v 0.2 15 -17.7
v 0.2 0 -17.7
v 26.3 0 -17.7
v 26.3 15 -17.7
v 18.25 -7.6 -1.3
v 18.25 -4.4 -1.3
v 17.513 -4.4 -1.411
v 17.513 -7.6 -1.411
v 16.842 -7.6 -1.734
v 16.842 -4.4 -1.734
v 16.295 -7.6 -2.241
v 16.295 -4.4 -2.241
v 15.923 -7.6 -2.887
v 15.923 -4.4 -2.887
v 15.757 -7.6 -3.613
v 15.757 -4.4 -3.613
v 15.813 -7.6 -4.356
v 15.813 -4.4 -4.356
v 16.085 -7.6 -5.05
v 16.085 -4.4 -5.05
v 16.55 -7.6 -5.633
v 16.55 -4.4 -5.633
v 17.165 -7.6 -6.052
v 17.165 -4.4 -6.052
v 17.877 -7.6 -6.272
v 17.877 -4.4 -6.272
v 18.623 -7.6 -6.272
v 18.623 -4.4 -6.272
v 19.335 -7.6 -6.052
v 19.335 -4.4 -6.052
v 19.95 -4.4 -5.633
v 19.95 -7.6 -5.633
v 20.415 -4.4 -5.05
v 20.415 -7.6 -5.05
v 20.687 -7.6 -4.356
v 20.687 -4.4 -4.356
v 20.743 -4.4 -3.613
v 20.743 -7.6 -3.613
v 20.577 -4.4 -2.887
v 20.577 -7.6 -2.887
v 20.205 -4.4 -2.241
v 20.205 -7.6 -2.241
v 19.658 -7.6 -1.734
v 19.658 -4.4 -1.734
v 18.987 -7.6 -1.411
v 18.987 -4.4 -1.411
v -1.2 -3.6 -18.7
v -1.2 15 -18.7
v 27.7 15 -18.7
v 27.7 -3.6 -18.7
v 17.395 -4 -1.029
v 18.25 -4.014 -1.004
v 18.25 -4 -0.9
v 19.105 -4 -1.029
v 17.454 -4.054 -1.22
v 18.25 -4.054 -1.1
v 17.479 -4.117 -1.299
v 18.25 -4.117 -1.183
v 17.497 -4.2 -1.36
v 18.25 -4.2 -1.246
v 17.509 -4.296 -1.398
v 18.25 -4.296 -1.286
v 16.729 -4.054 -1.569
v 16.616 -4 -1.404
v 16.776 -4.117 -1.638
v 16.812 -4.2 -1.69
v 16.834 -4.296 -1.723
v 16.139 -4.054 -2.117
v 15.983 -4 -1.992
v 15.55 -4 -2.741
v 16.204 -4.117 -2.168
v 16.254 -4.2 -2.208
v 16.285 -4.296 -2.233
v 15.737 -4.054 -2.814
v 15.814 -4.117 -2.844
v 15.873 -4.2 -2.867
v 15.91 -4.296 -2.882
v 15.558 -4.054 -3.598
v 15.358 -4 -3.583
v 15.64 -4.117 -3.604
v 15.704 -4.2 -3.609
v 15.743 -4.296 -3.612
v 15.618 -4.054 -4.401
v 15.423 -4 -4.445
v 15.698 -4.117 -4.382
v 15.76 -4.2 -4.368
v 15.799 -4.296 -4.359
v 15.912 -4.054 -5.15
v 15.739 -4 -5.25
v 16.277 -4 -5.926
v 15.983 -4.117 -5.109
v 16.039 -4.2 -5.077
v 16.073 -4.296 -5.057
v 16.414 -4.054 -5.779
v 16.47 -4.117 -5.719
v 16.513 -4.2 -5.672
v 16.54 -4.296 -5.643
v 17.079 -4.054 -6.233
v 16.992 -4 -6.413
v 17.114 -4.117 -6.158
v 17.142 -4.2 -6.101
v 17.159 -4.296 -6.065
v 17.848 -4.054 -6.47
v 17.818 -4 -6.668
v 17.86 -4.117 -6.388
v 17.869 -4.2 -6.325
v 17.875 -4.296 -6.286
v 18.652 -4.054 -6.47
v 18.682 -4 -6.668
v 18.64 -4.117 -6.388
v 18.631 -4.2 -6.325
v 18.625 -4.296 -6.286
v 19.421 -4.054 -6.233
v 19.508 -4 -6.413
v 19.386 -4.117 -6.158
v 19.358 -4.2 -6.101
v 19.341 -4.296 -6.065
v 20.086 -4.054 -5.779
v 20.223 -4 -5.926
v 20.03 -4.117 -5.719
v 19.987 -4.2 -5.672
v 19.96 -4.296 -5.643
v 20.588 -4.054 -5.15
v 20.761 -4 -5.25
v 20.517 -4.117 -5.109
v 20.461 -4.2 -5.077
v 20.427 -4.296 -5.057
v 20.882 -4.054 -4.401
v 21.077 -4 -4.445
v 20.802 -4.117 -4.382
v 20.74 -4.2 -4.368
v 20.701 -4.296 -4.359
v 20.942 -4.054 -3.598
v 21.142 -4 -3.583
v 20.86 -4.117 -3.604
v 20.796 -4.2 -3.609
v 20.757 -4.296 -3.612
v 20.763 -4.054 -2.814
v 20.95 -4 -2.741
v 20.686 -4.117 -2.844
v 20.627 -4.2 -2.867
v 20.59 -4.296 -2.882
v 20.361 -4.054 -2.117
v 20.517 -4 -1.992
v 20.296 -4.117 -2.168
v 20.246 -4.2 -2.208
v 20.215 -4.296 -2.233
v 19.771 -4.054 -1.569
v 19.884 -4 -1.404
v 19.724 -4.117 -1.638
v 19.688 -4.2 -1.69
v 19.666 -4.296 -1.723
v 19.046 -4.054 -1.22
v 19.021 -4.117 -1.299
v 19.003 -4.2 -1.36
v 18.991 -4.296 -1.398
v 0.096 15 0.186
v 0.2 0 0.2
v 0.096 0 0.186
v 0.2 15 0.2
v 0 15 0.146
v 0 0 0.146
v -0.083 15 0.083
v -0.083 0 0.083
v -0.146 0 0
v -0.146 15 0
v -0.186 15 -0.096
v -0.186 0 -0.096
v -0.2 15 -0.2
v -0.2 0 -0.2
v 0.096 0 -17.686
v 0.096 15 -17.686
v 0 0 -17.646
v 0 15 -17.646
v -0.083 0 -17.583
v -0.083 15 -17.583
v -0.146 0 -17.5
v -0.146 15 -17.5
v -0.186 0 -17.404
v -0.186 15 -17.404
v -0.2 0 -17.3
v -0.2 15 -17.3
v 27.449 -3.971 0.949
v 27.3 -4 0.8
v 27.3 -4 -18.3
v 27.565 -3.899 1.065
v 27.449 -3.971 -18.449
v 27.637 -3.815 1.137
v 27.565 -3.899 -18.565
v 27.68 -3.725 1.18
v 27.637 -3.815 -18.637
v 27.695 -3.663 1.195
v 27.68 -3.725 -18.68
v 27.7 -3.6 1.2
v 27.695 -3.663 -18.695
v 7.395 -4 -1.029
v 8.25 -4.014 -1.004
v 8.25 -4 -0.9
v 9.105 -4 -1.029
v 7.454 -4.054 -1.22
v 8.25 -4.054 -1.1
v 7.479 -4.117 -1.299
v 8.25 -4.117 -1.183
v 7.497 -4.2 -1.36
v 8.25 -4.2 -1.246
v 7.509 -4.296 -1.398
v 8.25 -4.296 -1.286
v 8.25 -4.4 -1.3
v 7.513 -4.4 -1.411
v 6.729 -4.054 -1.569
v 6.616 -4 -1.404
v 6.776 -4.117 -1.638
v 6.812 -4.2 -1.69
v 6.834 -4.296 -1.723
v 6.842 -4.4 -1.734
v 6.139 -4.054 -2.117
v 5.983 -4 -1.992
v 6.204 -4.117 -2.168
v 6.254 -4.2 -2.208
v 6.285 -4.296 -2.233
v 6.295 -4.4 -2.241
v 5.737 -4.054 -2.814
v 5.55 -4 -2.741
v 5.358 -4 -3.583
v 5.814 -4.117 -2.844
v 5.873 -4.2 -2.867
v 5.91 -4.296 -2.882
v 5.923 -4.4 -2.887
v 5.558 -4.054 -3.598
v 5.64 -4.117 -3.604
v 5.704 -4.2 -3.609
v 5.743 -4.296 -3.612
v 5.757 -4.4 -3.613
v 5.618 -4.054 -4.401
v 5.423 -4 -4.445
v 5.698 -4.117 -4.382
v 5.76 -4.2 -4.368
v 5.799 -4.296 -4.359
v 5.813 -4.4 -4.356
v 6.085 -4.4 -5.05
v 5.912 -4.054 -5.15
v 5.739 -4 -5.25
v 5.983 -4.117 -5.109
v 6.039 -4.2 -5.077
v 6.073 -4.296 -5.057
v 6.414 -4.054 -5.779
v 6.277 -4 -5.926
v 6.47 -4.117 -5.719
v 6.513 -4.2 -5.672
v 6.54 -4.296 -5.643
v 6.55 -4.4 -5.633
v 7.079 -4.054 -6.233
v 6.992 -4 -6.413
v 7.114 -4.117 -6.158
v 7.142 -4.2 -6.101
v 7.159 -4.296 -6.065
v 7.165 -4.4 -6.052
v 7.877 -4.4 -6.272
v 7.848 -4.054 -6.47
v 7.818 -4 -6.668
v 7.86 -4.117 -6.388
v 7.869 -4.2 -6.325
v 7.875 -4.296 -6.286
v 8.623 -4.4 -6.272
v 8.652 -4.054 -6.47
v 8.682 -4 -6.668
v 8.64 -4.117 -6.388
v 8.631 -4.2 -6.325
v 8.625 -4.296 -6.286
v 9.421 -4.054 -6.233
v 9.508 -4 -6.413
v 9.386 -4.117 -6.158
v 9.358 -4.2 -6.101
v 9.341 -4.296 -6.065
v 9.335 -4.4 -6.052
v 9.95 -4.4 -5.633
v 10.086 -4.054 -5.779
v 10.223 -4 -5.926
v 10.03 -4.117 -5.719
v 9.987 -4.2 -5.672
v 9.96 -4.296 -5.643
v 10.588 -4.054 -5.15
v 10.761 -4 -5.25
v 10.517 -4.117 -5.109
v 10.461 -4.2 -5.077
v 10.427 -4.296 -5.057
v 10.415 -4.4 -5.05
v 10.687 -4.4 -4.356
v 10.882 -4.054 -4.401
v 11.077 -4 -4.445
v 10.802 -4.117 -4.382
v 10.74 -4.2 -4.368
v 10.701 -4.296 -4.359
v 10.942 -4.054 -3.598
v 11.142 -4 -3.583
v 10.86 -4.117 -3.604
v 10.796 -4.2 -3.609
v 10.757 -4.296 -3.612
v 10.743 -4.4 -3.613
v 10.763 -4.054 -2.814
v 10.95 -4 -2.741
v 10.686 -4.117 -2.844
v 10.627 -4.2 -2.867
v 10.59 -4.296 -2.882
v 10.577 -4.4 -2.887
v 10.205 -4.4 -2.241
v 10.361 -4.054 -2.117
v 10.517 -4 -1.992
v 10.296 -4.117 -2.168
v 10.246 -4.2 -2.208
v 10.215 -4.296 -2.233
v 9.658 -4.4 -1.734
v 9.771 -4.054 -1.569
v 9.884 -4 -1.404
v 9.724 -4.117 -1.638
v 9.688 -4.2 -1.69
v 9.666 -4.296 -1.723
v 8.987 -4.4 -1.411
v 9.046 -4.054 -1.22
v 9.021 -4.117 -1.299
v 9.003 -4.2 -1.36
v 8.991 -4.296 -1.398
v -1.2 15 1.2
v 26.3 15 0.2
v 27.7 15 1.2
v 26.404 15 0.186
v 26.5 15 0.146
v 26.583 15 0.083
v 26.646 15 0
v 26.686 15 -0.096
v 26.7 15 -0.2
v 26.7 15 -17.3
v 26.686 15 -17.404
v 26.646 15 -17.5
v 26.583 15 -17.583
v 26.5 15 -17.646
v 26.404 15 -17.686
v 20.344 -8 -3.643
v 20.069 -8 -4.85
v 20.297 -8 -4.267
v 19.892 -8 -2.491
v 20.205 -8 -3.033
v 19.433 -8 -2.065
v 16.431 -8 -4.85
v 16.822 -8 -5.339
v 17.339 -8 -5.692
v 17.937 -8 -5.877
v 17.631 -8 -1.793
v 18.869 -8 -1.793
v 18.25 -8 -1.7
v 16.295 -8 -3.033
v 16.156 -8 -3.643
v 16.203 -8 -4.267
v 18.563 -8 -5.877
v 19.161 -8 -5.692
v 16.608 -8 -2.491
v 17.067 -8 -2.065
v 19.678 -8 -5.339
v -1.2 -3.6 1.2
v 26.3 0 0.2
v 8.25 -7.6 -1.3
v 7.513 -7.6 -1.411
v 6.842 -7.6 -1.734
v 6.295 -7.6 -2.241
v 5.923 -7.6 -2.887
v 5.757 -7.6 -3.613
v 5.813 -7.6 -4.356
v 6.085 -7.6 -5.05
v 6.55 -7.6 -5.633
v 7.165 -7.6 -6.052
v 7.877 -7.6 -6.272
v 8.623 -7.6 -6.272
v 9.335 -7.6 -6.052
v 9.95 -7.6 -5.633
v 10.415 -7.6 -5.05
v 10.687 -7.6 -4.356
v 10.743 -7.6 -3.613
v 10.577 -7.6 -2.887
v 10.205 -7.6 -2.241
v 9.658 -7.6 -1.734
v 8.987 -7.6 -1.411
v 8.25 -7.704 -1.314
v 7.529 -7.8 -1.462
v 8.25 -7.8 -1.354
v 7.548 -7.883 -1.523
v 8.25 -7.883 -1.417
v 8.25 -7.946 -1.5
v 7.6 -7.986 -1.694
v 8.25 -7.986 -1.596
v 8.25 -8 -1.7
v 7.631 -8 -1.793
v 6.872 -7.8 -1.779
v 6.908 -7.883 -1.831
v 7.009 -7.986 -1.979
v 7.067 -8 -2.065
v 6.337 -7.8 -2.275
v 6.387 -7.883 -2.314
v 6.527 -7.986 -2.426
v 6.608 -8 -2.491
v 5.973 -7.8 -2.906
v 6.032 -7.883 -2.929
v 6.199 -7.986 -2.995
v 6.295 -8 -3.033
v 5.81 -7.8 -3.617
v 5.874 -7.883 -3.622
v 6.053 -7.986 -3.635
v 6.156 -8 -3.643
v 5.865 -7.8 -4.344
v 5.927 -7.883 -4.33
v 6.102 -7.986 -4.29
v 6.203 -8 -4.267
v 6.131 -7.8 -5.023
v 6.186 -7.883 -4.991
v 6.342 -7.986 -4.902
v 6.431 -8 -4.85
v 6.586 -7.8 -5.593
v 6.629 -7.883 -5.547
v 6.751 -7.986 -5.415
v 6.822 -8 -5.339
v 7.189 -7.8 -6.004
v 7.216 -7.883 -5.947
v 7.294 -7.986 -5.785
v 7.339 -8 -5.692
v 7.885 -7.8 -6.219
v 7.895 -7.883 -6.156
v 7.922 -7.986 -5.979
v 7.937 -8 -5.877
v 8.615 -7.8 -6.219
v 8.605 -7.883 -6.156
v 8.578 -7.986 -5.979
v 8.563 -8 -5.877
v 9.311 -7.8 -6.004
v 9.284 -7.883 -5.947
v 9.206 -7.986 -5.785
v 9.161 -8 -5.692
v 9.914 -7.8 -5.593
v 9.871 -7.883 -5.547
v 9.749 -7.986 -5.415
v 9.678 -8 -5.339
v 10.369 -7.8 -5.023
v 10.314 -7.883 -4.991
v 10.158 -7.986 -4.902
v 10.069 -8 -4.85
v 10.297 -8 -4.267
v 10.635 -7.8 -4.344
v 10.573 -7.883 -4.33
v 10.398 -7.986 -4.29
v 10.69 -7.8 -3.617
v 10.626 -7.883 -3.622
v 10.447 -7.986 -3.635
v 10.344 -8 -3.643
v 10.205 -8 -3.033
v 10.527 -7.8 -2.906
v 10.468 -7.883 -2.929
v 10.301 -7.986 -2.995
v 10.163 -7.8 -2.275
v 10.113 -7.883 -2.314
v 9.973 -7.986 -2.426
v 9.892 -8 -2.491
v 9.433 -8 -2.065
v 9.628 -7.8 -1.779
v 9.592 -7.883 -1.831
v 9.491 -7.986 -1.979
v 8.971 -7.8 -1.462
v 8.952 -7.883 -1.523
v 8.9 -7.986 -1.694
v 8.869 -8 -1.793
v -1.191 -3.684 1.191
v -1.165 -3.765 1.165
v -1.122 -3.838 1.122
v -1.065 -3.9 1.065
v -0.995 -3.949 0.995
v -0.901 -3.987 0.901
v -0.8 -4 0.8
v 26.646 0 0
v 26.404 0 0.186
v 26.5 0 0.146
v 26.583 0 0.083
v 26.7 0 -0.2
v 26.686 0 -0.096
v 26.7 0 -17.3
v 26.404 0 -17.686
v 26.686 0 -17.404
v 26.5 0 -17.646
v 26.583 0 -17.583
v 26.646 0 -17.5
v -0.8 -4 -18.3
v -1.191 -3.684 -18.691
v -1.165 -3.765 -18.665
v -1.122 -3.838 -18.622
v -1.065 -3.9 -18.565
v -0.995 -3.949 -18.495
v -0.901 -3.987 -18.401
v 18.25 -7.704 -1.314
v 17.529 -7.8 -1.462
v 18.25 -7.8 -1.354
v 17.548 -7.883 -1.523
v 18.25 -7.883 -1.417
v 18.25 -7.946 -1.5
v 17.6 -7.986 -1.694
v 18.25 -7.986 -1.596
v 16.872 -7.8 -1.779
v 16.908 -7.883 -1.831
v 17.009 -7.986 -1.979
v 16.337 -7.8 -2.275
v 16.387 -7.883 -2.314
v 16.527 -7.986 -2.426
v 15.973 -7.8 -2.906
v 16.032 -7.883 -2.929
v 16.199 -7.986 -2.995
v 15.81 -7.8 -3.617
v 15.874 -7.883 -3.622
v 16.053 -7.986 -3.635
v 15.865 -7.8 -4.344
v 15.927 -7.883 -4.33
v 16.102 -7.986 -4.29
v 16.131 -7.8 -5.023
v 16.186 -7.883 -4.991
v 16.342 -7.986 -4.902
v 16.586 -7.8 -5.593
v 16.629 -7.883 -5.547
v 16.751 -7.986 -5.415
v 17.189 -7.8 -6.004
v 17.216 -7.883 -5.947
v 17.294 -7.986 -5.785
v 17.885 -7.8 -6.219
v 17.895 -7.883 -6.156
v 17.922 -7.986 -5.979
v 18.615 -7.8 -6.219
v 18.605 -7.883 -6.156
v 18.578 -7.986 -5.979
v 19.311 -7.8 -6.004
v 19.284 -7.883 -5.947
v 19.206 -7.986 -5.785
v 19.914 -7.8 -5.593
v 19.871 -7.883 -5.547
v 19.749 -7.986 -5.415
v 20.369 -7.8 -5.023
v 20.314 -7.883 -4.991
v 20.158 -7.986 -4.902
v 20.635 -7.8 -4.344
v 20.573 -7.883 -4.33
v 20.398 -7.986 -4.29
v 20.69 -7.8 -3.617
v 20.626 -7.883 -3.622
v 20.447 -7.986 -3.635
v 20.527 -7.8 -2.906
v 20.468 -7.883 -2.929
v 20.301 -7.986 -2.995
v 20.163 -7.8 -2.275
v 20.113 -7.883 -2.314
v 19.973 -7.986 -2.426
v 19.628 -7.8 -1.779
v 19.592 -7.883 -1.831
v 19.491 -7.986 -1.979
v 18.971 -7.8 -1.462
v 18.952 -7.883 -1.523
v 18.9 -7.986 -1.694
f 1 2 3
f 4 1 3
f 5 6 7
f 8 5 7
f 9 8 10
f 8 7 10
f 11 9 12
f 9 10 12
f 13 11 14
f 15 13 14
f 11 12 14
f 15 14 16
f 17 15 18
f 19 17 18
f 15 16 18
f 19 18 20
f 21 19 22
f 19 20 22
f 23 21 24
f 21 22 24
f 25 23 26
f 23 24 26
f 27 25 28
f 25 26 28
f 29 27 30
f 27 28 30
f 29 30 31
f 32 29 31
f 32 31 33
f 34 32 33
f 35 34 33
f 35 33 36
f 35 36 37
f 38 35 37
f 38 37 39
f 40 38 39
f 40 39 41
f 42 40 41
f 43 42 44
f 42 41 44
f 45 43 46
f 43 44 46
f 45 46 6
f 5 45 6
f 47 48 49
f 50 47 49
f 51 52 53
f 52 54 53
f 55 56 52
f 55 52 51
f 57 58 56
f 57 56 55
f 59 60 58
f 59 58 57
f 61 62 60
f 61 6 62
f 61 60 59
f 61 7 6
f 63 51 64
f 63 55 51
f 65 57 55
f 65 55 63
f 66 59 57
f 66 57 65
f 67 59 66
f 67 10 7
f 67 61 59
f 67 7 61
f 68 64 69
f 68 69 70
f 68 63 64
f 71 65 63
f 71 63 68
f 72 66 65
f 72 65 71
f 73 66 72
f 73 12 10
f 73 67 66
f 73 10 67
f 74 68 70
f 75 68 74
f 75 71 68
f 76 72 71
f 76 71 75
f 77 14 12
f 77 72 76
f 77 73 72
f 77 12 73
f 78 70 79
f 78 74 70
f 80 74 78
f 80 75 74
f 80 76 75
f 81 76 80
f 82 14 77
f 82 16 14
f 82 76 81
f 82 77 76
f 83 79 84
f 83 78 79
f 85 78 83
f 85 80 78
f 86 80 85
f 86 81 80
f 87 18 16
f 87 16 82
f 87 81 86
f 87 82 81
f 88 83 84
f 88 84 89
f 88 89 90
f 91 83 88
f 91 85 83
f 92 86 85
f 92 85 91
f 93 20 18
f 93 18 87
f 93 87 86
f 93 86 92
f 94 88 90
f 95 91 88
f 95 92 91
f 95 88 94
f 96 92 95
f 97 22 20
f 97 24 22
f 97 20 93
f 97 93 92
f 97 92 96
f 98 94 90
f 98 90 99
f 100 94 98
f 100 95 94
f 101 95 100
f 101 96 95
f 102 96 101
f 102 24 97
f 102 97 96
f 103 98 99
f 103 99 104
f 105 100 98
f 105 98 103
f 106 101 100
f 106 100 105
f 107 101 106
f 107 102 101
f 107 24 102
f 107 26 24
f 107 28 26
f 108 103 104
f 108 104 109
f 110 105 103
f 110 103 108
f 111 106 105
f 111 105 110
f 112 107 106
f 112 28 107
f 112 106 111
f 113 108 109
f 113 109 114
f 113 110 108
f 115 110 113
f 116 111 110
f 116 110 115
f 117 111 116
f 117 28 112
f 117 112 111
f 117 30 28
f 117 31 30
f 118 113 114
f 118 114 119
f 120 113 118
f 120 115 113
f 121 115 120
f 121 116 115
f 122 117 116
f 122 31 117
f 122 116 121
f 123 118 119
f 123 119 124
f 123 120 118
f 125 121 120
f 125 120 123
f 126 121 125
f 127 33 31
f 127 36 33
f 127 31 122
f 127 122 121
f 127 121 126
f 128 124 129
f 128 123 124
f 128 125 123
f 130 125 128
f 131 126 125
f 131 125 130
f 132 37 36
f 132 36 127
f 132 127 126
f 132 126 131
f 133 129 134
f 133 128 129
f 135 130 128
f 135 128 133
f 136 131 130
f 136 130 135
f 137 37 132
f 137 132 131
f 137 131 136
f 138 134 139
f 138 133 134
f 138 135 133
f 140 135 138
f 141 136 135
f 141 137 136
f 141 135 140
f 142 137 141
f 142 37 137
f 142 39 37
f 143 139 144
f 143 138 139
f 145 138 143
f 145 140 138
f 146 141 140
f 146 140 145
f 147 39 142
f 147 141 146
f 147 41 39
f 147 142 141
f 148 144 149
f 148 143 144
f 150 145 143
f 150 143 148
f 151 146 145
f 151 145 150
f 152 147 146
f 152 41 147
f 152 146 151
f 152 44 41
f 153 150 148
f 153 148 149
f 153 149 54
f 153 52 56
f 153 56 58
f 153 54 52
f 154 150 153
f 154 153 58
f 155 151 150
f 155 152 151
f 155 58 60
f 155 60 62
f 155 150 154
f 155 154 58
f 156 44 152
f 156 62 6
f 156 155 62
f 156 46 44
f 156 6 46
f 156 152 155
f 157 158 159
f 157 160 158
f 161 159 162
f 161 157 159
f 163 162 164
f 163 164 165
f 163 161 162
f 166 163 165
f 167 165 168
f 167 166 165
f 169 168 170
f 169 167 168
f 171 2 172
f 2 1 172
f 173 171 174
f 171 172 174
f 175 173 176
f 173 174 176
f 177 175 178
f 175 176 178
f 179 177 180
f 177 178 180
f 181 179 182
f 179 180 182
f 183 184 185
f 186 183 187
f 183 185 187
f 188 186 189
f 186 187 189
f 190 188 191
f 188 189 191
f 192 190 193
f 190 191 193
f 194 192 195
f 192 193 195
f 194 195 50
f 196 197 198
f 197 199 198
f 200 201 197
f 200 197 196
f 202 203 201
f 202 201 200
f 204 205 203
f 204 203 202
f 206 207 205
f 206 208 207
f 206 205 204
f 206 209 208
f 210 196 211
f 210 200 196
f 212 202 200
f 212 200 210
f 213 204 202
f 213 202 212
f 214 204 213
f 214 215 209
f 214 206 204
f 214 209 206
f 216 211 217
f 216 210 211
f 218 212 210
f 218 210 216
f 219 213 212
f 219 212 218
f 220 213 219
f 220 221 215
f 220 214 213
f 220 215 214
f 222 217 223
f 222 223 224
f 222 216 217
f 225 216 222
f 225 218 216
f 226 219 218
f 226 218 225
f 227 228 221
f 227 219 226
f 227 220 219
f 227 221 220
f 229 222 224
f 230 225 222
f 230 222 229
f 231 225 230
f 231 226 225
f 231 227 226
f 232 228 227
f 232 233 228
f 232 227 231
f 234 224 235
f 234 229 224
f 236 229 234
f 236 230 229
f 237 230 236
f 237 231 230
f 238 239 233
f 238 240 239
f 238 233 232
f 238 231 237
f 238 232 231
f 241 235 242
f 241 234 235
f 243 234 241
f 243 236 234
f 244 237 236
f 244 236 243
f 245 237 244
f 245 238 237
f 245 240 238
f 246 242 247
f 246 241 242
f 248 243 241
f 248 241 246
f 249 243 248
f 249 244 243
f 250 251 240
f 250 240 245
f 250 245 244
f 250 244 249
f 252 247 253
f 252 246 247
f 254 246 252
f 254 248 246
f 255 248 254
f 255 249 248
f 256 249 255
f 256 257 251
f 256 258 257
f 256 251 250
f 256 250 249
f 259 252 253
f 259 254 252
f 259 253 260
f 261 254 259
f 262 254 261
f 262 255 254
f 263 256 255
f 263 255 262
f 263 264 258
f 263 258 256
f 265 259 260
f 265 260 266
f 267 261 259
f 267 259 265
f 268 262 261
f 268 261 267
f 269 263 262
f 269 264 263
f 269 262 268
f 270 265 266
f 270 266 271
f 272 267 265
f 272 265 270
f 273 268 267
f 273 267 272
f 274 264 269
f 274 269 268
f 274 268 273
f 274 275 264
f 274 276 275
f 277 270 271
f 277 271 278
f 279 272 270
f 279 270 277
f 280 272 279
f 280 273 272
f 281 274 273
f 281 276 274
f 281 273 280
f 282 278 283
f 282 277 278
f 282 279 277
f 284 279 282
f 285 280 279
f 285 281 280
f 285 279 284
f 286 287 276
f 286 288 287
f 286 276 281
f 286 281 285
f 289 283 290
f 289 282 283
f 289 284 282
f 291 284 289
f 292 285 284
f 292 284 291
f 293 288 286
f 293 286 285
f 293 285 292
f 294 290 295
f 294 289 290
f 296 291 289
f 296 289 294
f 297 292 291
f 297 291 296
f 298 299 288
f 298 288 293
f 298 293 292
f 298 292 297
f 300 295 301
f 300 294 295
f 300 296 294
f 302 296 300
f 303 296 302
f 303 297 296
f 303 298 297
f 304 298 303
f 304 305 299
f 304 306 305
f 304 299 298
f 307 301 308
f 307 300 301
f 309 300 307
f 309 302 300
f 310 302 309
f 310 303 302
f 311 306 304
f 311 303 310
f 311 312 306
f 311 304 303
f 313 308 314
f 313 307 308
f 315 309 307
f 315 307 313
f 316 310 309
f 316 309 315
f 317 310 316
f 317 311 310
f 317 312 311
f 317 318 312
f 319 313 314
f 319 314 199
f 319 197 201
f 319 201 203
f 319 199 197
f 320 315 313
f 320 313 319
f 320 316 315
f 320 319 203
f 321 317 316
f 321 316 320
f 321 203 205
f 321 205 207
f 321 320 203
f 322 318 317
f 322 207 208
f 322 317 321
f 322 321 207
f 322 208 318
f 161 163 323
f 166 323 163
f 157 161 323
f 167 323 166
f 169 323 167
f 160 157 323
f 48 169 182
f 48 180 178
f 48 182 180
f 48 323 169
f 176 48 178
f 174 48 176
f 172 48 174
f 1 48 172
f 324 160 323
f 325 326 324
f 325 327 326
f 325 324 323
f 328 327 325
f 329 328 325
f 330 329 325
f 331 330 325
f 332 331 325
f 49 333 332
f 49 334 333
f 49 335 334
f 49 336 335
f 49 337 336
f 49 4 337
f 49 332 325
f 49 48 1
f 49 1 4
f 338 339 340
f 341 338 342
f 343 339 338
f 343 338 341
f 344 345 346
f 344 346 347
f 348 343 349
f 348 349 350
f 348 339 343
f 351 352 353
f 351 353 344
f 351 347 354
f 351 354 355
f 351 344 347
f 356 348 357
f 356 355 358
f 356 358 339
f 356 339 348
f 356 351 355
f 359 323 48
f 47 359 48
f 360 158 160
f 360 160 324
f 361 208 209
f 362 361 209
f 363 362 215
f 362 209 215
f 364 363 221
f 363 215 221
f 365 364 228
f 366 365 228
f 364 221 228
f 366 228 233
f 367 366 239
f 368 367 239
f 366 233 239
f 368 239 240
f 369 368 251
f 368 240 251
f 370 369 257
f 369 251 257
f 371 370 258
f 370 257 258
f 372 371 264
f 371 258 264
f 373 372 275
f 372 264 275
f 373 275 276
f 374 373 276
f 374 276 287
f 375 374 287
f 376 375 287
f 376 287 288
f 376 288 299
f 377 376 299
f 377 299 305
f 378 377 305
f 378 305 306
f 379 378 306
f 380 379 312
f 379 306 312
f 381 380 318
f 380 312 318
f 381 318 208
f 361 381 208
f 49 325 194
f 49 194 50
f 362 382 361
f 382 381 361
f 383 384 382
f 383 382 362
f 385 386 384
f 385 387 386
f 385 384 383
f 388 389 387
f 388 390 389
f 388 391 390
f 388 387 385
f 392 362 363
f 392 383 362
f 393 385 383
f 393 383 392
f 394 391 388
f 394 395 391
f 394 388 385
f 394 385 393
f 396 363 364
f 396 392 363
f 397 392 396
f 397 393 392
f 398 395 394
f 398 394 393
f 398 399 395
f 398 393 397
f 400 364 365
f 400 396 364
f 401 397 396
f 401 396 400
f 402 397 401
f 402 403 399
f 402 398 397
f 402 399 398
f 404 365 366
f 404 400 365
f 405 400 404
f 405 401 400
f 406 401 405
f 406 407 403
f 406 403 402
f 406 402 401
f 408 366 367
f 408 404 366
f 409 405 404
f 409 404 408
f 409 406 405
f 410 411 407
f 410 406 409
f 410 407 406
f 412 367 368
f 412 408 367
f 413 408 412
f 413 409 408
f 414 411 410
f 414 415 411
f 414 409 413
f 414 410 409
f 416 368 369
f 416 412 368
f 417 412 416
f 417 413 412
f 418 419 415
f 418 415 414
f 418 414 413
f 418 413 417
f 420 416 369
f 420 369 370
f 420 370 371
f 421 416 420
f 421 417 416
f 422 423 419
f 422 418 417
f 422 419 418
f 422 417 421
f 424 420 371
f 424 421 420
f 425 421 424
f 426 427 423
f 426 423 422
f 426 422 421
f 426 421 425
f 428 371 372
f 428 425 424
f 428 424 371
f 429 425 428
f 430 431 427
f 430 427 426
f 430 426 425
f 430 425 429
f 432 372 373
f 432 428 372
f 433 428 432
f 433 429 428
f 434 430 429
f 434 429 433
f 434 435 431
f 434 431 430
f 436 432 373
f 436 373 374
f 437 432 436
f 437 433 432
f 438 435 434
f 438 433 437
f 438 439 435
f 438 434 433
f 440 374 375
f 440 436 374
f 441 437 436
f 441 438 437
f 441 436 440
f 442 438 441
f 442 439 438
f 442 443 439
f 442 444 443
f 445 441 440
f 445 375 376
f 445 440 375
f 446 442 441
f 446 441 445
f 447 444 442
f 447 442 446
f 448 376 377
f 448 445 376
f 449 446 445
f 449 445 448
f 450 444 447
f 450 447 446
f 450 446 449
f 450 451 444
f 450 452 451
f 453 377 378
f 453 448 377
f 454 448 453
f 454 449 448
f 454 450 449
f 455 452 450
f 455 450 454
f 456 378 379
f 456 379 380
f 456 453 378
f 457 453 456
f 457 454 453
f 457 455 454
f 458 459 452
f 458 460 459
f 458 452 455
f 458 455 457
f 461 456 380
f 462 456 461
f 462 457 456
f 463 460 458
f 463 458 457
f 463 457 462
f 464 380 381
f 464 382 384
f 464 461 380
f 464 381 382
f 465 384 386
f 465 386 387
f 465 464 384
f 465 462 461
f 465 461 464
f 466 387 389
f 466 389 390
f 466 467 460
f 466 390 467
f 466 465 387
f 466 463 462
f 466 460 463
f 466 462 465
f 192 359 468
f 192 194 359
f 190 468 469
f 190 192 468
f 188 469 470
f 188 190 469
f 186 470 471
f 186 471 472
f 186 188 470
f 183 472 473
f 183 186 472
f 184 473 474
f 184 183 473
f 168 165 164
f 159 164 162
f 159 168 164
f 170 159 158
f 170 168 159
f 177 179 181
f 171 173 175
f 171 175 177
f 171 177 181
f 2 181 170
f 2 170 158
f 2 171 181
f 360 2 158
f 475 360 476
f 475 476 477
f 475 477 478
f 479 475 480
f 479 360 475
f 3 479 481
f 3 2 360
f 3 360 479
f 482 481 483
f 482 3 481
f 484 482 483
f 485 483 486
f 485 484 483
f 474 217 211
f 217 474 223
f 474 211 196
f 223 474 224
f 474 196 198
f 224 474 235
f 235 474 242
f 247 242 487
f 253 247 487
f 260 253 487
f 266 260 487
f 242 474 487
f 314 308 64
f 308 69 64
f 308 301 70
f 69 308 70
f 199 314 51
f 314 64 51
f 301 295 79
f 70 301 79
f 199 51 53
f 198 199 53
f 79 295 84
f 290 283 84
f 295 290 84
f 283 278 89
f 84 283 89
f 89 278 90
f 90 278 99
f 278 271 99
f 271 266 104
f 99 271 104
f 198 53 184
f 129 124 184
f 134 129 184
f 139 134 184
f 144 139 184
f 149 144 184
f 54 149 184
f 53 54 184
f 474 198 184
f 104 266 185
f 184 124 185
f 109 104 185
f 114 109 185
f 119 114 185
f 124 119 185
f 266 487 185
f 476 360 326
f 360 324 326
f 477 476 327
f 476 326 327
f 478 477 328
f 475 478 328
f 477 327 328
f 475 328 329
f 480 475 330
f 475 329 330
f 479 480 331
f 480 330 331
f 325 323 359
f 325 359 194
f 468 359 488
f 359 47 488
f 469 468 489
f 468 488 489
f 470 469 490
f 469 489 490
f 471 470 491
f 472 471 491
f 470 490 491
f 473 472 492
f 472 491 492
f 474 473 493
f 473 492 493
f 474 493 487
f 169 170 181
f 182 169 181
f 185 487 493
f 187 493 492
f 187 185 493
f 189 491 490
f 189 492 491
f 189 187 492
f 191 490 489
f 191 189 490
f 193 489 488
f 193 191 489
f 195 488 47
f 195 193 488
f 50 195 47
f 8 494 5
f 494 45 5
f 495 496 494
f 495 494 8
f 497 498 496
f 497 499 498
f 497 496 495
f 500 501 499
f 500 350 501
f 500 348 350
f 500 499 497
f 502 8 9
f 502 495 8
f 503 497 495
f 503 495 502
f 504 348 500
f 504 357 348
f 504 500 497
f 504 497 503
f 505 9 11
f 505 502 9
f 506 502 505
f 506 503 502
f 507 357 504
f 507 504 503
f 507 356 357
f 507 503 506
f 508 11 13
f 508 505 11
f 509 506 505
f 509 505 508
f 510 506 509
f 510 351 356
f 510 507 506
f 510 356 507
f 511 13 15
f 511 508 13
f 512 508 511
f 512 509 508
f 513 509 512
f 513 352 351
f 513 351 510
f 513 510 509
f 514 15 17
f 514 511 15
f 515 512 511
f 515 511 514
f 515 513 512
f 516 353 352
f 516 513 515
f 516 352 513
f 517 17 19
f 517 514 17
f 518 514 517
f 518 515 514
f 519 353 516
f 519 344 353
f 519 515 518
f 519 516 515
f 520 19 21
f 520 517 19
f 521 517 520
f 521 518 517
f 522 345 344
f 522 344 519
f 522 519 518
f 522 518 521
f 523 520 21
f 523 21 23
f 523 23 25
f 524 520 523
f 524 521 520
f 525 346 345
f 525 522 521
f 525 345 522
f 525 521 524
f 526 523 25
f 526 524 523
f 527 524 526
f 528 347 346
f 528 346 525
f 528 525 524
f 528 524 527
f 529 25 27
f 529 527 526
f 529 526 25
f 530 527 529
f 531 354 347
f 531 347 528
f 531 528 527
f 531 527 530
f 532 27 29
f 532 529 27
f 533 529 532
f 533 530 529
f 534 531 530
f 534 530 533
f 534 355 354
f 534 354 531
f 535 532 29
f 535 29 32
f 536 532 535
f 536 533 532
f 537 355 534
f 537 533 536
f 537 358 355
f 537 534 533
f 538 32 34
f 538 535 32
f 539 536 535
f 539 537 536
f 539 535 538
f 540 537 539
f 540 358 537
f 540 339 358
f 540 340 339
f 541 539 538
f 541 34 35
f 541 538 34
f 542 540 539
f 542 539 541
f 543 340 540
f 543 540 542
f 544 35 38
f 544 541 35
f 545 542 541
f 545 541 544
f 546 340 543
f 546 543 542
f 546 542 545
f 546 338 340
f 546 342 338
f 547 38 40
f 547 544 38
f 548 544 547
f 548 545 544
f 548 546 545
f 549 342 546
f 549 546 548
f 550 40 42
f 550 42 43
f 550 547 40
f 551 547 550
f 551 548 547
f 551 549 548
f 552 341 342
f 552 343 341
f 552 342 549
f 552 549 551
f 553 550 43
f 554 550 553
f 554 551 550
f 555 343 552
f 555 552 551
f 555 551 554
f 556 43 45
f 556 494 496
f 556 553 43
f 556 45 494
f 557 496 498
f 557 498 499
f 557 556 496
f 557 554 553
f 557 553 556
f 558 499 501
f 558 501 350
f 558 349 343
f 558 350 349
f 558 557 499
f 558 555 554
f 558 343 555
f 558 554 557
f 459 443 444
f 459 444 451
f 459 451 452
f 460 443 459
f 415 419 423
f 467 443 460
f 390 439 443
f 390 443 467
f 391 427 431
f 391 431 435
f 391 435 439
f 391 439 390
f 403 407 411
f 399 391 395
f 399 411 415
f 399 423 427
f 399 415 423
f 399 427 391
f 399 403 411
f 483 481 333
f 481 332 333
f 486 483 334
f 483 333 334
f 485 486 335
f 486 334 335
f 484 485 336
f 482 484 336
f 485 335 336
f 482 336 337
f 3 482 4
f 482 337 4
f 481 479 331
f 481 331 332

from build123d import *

# Parameters (mm, degrees)
SKETCH1_W           = 28.9
SKETCH1_H           = 19.9
SKETCH1_W_2         = 26.9
SKETCH1_H_2         = 17.9
BOSS_EXTRUDE1_DEPTH = 15
SKETCH1_3_W         = 28.9
SKETCH1_3_H         = 19.9
BOSS_EXTRUDE2_DEPTH = 4
SKETCH2_R           = 2.5
BOSS_EXTRUDE3_DEPTH = 4
FILLET1_R           = 0.4
FILLET2_R           = 0.4


with BuildPart() as part:
    # Sketch1 → Boss-Extrude1 (new body)
    with BuildSketch(Plane(origin=(0, 0, 0), x_dir=(1, 0, 0), z_dir=(0, 1, 0))):
        with Locations((13.25, 8.75)):
            Rectangle(SKETCH1_W, SKETCH1_H)
        with Locations((13.25, 8.75)):
            Rectangle(SKETCH1_W_2, SKETCH1_H_2, mode=Mode.SUBTRACT)
    extrude(amount=BOSS_EXTRUDE1_DEPTH)

    # Sketch1<3> → Boss-Extrude2 (add)
    with BuildSketch(Plane(origin=(0, 0, 0), x_dir=(1, 0, 0), z_dir=(0, 1, 0))):
        with Locations((13.25, 8.75)):
            Rectangle(SKETCH1_3_W, SKETCH1_3_H)
    extrude(amount=-BOSS_EXTRUDE2_DEPTH)

    # Sketch2 → Boss-Extrude3 (add)
    with BuildSketch(Plane.XZ.offset(4)):
        with Locations((8.25, -3.8)):
            Circle(SKETCH2_R)
        with Locations((18.25, -3.8)):
            Circle(SKETCH2_R)
    extrude(amount=BOSS_EXTRUDE3_DEPTH)

    # Fillet1
    fillet1_edges = [part.edges().sort_by_distance(p)[0] for p in [
        (13.25, -4, 1.2),
        (27.7, -4, -8.75),
        (13.25, -4, -18.7),
        (-1.2, -4, -8.75),
        (5.75, -4, -3.8),
        (15.75, -4, -3.8),
        (15.75, -8, -3.8),
        (5.75, -8, -3.8),
    ]]
    fillet(fillet1_edges, radius=FILLET1_R)

    # Fillet2
    fillet2_edges = [part.edges().sort_by_distance(p)[0] for p in [
        (26.7, 7.5, 0.2),
        (26.7, 7.5, -17.7),
        (-0.2, 7.5, 0.2),
        (-0.2, 7.5, -17.7),
    ]]
    fillet(fillet2_edges, radius=FILLET2_R)


solid = part.part
